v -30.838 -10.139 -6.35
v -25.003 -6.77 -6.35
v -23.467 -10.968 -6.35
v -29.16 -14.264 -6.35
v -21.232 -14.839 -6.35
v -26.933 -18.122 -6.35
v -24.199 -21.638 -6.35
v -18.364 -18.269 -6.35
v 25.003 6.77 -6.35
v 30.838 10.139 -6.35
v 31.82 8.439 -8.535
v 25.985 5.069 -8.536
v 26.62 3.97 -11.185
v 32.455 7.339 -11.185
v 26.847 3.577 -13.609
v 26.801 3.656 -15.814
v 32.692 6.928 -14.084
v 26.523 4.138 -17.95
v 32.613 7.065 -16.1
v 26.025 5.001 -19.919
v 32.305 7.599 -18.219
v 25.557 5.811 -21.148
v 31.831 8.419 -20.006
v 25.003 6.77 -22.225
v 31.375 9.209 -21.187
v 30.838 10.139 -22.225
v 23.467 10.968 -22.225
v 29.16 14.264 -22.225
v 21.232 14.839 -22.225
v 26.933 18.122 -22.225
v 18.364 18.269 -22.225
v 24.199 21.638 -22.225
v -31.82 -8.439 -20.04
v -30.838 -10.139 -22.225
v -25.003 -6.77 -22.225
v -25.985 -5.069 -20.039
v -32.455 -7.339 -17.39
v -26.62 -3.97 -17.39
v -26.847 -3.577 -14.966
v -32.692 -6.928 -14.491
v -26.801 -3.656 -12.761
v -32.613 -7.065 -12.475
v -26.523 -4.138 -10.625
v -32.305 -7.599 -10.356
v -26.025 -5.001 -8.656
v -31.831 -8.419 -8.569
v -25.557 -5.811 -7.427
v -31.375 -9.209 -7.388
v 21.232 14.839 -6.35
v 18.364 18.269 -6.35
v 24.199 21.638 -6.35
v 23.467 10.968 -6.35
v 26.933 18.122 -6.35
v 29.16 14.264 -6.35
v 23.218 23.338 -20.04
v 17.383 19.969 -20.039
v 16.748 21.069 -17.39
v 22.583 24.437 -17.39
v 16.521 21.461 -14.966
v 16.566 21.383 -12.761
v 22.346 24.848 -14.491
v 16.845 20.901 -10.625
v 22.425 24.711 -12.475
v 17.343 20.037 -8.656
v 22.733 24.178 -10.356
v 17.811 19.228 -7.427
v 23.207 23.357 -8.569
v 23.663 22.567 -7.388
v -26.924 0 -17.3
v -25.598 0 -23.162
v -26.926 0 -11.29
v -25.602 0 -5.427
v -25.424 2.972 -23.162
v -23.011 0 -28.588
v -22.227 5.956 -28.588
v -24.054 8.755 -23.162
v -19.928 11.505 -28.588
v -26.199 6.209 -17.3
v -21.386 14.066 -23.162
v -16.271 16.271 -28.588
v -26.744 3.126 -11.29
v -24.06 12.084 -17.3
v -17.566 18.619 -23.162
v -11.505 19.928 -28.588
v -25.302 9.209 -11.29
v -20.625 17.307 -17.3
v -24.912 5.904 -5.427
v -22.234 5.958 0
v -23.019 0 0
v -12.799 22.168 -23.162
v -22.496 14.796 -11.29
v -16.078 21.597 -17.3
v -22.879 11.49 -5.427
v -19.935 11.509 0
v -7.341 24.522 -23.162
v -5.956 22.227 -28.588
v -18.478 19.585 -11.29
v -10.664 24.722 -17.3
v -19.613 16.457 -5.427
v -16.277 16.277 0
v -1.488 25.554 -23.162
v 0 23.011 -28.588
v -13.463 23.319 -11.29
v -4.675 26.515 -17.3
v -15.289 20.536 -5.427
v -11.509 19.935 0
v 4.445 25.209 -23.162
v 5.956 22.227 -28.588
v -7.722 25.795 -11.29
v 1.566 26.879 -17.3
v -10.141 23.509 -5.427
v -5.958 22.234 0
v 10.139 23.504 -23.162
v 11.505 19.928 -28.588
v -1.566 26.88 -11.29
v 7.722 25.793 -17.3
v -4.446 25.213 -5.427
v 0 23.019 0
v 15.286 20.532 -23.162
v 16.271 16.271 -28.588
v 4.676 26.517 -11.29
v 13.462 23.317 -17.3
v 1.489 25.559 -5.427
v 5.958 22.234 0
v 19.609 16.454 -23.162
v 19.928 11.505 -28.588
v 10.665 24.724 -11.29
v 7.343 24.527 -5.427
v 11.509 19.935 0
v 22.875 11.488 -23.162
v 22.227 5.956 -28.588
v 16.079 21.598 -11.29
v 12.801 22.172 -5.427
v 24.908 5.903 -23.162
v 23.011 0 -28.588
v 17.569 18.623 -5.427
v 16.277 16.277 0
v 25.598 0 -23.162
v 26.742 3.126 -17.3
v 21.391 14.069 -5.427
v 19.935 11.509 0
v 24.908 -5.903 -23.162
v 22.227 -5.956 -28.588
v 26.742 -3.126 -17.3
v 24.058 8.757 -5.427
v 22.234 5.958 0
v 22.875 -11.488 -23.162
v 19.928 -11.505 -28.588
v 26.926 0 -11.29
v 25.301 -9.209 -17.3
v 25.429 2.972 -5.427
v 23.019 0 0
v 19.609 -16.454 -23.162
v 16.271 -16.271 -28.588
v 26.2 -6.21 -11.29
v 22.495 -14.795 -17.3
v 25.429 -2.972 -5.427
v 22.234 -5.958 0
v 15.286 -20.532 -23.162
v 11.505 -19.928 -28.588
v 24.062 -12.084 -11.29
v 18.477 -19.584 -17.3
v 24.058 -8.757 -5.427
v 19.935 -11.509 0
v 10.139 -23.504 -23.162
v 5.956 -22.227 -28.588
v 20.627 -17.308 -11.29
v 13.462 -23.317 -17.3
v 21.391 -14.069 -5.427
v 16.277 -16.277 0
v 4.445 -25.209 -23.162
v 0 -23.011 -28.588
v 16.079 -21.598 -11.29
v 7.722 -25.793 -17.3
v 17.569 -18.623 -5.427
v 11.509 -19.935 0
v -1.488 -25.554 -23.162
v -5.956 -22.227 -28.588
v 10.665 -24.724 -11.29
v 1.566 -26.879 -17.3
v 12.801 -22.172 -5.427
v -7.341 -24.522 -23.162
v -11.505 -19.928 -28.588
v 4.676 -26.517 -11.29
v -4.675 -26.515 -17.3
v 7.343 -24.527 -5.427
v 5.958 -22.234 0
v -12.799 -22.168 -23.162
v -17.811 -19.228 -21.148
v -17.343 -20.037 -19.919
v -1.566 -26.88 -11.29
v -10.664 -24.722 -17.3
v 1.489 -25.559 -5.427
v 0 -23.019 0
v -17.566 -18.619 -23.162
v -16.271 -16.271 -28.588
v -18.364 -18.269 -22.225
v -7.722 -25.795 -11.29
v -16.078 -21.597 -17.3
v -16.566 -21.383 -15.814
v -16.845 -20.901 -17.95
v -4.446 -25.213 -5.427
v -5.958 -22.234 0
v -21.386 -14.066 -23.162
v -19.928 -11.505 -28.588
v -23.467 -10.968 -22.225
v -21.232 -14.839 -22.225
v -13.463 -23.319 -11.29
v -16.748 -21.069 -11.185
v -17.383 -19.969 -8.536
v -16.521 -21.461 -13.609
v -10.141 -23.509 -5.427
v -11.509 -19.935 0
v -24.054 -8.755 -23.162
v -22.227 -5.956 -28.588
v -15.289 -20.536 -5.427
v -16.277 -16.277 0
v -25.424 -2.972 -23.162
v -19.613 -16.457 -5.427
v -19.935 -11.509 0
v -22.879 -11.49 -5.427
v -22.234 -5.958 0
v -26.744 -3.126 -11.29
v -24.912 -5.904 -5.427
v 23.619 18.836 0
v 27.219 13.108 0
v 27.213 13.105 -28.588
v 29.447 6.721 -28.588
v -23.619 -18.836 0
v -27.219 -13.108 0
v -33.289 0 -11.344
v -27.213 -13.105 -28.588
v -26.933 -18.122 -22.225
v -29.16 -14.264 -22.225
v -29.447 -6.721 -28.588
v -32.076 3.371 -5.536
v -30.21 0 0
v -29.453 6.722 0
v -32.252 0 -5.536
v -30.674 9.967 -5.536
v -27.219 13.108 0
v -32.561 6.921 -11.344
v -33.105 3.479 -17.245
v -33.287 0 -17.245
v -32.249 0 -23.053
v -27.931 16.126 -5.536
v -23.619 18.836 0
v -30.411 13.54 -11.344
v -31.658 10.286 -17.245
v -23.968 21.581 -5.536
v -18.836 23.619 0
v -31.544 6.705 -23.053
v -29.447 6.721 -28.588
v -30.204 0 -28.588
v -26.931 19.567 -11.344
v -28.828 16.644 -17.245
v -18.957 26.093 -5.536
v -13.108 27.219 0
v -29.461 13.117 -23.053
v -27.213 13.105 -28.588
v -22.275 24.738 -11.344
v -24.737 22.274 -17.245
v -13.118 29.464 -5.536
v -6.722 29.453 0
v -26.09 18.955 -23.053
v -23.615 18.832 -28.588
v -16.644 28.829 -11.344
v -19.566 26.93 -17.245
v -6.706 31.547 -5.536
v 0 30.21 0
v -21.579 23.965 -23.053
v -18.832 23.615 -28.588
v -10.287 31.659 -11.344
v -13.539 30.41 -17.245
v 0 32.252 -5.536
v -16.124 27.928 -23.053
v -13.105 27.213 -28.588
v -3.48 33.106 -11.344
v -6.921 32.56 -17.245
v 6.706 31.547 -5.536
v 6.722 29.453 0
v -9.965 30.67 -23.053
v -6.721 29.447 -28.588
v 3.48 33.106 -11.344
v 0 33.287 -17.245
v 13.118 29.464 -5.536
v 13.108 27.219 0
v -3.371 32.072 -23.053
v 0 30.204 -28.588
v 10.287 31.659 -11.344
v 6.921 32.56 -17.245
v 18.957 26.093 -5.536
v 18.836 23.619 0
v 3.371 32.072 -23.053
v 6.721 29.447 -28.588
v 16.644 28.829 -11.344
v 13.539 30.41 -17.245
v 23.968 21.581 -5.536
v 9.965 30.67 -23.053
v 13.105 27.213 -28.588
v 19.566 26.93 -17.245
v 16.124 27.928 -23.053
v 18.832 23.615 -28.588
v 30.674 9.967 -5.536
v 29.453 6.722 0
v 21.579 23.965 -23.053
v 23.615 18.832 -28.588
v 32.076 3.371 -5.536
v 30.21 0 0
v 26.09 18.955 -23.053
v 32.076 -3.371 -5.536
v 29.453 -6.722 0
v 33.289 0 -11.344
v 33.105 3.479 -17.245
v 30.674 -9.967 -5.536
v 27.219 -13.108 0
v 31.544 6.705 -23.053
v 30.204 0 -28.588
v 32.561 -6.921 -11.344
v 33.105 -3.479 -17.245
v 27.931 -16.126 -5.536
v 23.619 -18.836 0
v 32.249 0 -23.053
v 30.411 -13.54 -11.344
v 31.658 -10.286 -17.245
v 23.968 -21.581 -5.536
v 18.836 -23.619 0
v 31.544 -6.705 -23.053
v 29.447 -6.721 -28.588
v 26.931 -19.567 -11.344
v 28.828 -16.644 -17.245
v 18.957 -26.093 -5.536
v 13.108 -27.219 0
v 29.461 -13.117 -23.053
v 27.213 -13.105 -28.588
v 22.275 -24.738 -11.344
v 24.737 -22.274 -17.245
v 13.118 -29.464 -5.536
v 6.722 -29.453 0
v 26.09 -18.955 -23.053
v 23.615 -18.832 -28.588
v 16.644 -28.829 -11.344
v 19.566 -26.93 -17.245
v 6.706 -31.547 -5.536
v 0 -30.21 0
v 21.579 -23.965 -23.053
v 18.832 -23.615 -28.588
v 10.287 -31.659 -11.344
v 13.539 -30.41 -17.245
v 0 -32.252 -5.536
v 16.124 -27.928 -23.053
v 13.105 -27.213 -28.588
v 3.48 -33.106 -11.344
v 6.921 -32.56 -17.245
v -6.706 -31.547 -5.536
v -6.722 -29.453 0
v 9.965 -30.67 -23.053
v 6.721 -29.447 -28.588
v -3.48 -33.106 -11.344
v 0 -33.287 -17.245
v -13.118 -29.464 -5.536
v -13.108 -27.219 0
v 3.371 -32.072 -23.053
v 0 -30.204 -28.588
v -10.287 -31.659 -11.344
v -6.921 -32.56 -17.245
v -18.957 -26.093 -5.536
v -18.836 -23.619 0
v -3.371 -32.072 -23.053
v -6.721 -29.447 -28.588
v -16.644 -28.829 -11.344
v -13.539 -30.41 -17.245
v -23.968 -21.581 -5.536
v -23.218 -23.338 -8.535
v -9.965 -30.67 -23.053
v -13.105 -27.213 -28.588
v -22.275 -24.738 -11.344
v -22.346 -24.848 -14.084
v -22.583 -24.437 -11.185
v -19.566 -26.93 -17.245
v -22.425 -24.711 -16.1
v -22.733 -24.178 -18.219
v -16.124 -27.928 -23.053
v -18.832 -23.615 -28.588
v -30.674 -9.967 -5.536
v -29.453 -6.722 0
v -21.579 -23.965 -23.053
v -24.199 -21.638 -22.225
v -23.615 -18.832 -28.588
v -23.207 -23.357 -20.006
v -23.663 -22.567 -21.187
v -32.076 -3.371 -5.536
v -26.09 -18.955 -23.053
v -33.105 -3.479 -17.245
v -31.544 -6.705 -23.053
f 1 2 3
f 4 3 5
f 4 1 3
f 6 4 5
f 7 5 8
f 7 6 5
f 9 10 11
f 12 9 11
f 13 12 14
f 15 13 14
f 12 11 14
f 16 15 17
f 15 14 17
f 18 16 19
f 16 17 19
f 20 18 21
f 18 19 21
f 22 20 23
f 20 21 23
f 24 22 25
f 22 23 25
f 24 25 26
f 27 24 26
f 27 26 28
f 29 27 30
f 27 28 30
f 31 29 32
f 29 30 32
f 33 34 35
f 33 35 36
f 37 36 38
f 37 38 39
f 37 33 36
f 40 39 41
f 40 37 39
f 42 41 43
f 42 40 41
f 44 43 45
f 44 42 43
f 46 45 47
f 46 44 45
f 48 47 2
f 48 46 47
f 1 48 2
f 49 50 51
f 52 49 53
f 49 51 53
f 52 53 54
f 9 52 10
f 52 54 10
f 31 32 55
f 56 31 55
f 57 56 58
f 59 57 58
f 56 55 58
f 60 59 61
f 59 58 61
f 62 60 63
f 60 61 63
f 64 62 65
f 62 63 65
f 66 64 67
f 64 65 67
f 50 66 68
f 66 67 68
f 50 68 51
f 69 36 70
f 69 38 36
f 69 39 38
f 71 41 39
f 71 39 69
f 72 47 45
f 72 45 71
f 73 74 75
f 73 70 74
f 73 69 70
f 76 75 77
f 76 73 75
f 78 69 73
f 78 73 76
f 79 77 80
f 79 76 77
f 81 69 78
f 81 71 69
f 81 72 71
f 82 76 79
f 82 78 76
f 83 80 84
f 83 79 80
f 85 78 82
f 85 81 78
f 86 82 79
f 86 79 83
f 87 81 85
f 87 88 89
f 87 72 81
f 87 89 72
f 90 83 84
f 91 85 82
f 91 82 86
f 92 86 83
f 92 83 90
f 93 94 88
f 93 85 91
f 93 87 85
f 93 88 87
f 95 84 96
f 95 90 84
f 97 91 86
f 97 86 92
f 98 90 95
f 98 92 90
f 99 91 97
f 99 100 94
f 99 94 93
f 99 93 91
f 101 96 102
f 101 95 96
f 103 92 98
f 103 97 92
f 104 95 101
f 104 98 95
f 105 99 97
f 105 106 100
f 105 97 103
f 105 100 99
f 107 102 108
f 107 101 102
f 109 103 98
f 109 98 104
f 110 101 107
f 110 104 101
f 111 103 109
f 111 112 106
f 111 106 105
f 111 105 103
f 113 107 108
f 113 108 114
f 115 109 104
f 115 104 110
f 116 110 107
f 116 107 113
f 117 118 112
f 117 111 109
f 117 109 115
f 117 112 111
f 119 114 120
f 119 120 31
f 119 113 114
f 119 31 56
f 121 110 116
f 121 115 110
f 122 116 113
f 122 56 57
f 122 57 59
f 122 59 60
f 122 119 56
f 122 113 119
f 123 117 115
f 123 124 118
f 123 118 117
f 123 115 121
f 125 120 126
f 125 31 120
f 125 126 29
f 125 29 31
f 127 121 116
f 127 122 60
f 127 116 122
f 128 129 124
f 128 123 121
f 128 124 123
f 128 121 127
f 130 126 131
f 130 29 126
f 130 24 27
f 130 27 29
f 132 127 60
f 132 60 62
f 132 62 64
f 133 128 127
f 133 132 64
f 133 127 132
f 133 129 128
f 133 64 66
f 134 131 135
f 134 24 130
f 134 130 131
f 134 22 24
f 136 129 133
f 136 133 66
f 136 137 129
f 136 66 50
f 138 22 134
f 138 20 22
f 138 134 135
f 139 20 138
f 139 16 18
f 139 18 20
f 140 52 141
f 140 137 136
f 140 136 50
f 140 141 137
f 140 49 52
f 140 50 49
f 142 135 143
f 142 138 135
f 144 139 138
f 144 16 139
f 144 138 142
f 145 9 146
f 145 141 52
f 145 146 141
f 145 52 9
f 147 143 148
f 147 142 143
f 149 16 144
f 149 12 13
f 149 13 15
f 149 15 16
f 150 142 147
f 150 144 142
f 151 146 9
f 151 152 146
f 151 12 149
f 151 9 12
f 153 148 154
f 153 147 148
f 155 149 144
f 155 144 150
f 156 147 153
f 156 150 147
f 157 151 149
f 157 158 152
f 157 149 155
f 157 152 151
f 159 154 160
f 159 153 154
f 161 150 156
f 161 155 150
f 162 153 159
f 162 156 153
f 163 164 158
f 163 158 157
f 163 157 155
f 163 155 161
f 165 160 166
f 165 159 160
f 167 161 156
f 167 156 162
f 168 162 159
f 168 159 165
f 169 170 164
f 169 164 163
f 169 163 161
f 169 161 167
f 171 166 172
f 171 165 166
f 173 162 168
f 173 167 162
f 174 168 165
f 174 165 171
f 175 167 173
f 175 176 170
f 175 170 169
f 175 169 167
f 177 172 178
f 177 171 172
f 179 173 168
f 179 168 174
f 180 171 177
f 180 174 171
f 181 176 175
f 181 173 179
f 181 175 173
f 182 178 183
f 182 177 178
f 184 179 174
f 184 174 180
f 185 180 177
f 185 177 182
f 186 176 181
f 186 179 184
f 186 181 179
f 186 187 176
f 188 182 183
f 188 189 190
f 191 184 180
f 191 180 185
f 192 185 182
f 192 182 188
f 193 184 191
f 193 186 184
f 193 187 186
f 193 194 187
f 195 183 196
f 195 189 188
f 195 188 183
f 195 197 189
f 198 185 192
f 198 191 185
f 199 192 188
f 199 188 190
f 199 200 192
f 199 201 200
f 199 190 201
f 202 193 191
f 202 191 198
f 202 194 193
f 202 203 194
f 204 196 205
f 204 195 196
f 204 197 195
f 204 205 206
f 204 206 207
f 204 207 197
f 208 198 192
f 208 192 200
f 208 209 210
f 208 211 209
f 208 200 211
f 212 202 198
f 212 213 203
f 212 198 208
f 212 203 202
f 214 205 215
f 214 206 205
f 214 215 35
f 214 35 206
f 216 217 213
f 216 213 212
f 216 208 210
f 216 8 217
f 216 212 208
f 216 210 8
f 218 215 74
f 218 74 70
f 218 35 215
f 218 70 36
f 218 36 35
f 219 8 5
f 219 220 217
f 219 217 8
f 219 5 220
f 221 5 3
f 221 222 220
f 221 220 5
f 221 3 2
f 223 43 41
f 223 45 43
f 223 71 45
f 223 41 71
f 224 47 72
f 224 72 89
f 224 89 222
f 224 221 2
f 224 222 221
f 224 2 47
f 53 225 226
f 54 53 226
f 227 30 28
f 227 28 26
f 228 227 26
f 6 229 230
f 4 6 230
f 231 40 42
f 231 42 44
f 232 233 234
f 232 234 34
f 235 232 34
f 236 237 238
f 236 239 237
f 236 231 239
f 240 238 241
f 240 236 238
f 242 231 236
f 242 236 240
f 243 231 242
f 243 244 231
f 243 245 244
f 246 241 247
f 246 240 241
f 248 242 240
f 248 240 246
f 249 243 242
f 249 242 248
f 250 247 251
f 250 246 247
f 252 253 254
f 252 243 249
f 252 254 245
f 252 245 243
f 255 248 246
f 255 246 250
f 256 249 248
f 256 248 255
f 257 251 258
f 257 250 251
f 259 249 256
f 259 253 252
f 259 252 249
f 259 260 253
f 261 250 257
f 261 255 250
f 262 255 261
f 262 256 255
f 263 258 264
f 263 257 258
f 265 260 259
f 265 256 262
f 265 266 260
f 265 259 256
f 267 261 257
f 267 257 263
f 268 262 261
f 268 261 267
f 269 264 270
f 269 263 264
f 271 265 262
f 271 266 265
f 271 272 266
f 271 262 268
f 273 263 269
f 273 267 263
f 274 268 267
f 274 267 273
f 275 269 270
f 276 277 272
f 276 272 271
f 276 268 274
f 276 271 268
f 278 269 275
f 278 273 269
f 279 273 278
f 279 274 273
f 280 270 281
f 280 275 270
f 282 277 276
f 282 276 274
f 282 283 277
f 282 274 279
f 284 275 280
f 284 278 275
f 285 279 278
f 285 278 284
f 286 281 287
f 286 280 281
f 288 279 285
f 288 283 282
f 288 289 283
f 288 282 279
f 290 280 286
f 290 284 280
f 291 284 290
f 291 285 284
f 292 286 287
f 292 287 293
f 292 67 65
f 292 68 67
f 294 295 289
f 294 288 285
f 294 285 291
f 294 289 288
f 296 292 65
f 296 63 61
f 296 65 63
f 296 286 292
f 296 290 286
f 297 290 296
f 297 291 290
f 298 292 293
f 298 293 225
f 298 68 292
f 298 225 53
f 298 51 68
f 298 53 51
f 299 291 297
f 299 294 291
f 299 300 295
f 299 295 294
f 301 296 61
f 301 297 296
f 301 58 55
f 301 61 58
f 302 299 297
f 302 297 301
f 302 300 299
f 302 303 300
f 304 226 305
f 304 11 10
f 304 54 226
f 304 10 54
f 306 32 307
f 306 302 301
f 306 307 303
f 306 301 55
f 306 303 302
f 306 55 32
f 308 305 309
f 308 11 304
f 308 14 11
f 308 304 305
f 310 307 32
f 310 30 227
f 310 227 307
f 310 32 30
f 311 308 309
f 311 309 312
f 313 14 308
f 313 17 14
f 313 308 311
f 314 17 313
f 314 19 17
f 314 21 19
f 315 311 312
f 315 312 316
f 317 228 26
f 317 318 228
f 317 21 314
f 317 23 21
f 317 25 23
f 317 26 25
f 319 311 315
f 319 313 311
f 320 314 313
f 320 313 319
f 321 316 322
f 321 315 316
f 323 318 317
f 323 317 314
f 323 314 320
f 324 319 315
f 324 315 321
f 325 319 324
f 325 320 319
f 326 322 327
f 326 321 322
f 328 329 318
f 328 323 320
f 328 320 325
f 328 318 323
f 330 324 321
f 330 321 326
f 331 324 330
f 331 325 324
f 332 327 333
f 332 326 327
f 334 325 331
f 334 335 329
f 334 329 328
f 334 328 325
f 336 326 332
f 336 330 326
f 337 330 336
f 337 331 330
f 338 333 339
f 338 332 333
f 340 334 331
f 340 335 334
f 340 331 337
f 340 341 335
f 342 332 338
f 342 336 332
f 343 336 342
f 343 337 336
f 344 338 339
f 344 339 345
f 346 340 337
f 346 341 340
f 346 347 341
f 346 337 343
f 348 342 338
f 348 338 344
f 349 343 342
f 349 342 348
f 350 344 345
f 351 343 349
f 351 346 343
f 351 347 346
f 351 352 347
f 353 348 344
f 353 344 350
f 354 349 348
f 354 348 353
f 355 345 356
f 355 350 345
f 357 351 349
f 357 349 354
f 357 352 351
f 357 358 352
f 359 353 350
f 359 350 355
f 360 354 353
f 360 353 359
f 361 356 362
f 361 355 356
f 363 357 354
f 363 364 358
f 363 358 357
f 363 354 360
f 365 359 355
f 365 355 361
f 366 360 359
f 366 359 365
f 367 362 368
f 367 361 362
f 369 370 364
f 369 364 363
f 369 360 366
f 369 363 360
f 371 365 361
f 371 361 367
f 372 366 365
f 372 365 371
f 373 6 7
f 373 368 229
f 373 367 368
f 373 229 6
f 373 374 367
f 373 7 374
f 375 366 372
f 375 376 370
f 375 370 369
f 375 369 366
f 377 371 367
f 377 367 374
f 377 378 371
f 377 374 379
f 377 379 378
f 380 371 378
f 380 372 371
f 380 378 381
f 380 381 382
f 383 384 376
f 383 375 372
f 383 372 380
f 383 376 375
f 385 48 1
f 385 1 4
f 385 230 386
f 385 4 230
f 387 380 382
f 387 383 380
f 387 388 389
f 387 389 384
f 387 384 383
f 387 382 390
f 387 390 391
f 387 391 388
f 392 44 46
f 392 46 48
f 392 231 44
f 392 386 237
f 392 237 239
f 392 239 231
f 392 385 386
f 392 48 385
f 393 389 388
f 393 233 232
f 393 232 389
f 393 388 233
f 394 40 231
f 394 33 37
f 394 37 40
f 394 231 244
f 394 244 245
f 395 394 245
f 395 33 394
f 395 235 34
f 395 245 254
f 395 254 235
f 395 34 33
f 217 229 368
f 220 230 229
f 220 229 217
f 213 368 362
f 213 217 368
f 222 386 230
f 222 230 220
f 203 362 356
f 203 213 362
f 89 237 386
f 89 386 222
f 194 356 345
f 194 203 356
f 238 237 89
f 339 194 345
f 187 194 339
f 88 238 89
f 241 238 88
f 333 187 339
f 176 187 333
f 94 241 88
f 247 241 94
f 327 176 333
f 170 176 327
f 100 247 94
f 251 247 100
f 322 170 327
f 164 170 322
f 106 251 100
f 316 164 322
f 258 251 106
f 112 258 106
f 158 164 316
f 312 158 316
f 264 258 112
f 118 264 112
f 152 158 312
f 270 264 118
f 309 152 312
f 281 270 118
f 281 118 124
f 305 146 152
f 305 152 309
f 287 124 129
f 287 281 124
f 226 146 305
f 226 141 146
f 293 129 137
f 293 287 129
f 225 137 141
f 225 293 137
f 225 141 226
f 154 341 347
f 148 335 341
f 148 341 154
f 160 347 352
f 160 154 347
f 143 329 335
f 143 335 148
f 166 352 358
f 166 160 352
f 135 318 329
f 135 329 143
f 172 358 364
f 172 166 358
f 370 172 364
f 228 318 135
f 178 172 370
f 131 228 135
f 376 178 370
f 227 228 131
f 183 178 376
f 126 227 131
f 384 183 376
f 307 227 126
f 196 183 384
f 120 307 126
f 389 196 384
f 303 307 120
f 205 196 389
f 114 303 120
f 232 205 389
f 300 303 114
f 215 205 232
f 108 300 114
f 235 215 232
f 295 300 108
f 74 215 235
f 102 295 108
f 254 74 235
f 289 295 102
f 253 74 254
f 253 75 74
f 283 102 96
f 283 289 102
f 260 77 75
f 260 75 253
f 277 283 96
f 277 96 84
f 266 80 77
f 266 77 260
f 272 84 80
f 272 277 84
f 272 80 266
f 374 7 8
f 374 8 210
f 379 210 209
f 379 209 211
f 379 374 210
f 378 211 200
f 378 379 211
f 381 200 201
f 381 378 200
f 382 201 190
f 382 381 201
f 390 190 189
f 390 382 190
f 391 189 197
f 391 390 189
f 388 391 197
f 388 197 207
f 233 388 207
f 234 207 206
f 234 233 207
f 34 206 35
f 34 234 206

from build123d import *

# Parameters (mm, degrees)
F5_DEPTH = 12.7


# Not quite as in the source:
# - a pattern or mirror of a feature is missing from the dataset's text; its kind, count and spacing are read off the source's solid


with BuildPart() as f1:
    # F0 (on Front) → F1 (revolve)
    with BuildSketch(Plane.XZ):
        with BuildLine():
            ThreePointArc((-23.0108623865, -28.5877), (-27.0923504321, -14.2949750325), (-23.01875, 0))
            Line((-23.01875, 0), (-30.2104195144, 0))
            ThreePointArc((-30.2104195144, 0), (-33.4185884522, -14.2945250314), (-30.20441, -28.5877))
            Line((-30.20441, -28.5877), (-23.0108623865, -28.5877))
        make_face()
    revolve(axis=Axis((0, 0, -13.0283376202), (0, 0, -1)))

    # F4 (on line) → F5 (cut)
    with BuildSketch(Plane(origin=(28.9413471977, 16.7092945953, 0), x_dir=(-0.5, 0.8660254038, 0), z_dir=(0.8660254038, 0.5, 0))):
        with BuildLine():
            Line((-6.6390036837, -22.225), (6.6390036837, -22.225))
            ThreePointArc((6.6390036837, -22.225), (10.34796, -14.2875), (6.6390036837, -6.35))
            Line((6.6390036837, -6.35), (-6.6390036837, -6.35))
            ThreePointArc((-6.6390036837, -6.35), (-10.34796, -14.2875), (-6.6390036837, -22.225))
        make_face()
    f5 = extrude(amount=-F5_DEPTH, mode=Mode.SUBTRACT)

    # F5_copies: F5 across plane
    add(f5.mirror(Plane(origin=(0, 0, 0), x_dir=(0.5, -0.8660254038, 0), z_dir=(-0.8660254038, -0.5, 0))), mode=Mode.SUBTRACT)


solid = f1.part
